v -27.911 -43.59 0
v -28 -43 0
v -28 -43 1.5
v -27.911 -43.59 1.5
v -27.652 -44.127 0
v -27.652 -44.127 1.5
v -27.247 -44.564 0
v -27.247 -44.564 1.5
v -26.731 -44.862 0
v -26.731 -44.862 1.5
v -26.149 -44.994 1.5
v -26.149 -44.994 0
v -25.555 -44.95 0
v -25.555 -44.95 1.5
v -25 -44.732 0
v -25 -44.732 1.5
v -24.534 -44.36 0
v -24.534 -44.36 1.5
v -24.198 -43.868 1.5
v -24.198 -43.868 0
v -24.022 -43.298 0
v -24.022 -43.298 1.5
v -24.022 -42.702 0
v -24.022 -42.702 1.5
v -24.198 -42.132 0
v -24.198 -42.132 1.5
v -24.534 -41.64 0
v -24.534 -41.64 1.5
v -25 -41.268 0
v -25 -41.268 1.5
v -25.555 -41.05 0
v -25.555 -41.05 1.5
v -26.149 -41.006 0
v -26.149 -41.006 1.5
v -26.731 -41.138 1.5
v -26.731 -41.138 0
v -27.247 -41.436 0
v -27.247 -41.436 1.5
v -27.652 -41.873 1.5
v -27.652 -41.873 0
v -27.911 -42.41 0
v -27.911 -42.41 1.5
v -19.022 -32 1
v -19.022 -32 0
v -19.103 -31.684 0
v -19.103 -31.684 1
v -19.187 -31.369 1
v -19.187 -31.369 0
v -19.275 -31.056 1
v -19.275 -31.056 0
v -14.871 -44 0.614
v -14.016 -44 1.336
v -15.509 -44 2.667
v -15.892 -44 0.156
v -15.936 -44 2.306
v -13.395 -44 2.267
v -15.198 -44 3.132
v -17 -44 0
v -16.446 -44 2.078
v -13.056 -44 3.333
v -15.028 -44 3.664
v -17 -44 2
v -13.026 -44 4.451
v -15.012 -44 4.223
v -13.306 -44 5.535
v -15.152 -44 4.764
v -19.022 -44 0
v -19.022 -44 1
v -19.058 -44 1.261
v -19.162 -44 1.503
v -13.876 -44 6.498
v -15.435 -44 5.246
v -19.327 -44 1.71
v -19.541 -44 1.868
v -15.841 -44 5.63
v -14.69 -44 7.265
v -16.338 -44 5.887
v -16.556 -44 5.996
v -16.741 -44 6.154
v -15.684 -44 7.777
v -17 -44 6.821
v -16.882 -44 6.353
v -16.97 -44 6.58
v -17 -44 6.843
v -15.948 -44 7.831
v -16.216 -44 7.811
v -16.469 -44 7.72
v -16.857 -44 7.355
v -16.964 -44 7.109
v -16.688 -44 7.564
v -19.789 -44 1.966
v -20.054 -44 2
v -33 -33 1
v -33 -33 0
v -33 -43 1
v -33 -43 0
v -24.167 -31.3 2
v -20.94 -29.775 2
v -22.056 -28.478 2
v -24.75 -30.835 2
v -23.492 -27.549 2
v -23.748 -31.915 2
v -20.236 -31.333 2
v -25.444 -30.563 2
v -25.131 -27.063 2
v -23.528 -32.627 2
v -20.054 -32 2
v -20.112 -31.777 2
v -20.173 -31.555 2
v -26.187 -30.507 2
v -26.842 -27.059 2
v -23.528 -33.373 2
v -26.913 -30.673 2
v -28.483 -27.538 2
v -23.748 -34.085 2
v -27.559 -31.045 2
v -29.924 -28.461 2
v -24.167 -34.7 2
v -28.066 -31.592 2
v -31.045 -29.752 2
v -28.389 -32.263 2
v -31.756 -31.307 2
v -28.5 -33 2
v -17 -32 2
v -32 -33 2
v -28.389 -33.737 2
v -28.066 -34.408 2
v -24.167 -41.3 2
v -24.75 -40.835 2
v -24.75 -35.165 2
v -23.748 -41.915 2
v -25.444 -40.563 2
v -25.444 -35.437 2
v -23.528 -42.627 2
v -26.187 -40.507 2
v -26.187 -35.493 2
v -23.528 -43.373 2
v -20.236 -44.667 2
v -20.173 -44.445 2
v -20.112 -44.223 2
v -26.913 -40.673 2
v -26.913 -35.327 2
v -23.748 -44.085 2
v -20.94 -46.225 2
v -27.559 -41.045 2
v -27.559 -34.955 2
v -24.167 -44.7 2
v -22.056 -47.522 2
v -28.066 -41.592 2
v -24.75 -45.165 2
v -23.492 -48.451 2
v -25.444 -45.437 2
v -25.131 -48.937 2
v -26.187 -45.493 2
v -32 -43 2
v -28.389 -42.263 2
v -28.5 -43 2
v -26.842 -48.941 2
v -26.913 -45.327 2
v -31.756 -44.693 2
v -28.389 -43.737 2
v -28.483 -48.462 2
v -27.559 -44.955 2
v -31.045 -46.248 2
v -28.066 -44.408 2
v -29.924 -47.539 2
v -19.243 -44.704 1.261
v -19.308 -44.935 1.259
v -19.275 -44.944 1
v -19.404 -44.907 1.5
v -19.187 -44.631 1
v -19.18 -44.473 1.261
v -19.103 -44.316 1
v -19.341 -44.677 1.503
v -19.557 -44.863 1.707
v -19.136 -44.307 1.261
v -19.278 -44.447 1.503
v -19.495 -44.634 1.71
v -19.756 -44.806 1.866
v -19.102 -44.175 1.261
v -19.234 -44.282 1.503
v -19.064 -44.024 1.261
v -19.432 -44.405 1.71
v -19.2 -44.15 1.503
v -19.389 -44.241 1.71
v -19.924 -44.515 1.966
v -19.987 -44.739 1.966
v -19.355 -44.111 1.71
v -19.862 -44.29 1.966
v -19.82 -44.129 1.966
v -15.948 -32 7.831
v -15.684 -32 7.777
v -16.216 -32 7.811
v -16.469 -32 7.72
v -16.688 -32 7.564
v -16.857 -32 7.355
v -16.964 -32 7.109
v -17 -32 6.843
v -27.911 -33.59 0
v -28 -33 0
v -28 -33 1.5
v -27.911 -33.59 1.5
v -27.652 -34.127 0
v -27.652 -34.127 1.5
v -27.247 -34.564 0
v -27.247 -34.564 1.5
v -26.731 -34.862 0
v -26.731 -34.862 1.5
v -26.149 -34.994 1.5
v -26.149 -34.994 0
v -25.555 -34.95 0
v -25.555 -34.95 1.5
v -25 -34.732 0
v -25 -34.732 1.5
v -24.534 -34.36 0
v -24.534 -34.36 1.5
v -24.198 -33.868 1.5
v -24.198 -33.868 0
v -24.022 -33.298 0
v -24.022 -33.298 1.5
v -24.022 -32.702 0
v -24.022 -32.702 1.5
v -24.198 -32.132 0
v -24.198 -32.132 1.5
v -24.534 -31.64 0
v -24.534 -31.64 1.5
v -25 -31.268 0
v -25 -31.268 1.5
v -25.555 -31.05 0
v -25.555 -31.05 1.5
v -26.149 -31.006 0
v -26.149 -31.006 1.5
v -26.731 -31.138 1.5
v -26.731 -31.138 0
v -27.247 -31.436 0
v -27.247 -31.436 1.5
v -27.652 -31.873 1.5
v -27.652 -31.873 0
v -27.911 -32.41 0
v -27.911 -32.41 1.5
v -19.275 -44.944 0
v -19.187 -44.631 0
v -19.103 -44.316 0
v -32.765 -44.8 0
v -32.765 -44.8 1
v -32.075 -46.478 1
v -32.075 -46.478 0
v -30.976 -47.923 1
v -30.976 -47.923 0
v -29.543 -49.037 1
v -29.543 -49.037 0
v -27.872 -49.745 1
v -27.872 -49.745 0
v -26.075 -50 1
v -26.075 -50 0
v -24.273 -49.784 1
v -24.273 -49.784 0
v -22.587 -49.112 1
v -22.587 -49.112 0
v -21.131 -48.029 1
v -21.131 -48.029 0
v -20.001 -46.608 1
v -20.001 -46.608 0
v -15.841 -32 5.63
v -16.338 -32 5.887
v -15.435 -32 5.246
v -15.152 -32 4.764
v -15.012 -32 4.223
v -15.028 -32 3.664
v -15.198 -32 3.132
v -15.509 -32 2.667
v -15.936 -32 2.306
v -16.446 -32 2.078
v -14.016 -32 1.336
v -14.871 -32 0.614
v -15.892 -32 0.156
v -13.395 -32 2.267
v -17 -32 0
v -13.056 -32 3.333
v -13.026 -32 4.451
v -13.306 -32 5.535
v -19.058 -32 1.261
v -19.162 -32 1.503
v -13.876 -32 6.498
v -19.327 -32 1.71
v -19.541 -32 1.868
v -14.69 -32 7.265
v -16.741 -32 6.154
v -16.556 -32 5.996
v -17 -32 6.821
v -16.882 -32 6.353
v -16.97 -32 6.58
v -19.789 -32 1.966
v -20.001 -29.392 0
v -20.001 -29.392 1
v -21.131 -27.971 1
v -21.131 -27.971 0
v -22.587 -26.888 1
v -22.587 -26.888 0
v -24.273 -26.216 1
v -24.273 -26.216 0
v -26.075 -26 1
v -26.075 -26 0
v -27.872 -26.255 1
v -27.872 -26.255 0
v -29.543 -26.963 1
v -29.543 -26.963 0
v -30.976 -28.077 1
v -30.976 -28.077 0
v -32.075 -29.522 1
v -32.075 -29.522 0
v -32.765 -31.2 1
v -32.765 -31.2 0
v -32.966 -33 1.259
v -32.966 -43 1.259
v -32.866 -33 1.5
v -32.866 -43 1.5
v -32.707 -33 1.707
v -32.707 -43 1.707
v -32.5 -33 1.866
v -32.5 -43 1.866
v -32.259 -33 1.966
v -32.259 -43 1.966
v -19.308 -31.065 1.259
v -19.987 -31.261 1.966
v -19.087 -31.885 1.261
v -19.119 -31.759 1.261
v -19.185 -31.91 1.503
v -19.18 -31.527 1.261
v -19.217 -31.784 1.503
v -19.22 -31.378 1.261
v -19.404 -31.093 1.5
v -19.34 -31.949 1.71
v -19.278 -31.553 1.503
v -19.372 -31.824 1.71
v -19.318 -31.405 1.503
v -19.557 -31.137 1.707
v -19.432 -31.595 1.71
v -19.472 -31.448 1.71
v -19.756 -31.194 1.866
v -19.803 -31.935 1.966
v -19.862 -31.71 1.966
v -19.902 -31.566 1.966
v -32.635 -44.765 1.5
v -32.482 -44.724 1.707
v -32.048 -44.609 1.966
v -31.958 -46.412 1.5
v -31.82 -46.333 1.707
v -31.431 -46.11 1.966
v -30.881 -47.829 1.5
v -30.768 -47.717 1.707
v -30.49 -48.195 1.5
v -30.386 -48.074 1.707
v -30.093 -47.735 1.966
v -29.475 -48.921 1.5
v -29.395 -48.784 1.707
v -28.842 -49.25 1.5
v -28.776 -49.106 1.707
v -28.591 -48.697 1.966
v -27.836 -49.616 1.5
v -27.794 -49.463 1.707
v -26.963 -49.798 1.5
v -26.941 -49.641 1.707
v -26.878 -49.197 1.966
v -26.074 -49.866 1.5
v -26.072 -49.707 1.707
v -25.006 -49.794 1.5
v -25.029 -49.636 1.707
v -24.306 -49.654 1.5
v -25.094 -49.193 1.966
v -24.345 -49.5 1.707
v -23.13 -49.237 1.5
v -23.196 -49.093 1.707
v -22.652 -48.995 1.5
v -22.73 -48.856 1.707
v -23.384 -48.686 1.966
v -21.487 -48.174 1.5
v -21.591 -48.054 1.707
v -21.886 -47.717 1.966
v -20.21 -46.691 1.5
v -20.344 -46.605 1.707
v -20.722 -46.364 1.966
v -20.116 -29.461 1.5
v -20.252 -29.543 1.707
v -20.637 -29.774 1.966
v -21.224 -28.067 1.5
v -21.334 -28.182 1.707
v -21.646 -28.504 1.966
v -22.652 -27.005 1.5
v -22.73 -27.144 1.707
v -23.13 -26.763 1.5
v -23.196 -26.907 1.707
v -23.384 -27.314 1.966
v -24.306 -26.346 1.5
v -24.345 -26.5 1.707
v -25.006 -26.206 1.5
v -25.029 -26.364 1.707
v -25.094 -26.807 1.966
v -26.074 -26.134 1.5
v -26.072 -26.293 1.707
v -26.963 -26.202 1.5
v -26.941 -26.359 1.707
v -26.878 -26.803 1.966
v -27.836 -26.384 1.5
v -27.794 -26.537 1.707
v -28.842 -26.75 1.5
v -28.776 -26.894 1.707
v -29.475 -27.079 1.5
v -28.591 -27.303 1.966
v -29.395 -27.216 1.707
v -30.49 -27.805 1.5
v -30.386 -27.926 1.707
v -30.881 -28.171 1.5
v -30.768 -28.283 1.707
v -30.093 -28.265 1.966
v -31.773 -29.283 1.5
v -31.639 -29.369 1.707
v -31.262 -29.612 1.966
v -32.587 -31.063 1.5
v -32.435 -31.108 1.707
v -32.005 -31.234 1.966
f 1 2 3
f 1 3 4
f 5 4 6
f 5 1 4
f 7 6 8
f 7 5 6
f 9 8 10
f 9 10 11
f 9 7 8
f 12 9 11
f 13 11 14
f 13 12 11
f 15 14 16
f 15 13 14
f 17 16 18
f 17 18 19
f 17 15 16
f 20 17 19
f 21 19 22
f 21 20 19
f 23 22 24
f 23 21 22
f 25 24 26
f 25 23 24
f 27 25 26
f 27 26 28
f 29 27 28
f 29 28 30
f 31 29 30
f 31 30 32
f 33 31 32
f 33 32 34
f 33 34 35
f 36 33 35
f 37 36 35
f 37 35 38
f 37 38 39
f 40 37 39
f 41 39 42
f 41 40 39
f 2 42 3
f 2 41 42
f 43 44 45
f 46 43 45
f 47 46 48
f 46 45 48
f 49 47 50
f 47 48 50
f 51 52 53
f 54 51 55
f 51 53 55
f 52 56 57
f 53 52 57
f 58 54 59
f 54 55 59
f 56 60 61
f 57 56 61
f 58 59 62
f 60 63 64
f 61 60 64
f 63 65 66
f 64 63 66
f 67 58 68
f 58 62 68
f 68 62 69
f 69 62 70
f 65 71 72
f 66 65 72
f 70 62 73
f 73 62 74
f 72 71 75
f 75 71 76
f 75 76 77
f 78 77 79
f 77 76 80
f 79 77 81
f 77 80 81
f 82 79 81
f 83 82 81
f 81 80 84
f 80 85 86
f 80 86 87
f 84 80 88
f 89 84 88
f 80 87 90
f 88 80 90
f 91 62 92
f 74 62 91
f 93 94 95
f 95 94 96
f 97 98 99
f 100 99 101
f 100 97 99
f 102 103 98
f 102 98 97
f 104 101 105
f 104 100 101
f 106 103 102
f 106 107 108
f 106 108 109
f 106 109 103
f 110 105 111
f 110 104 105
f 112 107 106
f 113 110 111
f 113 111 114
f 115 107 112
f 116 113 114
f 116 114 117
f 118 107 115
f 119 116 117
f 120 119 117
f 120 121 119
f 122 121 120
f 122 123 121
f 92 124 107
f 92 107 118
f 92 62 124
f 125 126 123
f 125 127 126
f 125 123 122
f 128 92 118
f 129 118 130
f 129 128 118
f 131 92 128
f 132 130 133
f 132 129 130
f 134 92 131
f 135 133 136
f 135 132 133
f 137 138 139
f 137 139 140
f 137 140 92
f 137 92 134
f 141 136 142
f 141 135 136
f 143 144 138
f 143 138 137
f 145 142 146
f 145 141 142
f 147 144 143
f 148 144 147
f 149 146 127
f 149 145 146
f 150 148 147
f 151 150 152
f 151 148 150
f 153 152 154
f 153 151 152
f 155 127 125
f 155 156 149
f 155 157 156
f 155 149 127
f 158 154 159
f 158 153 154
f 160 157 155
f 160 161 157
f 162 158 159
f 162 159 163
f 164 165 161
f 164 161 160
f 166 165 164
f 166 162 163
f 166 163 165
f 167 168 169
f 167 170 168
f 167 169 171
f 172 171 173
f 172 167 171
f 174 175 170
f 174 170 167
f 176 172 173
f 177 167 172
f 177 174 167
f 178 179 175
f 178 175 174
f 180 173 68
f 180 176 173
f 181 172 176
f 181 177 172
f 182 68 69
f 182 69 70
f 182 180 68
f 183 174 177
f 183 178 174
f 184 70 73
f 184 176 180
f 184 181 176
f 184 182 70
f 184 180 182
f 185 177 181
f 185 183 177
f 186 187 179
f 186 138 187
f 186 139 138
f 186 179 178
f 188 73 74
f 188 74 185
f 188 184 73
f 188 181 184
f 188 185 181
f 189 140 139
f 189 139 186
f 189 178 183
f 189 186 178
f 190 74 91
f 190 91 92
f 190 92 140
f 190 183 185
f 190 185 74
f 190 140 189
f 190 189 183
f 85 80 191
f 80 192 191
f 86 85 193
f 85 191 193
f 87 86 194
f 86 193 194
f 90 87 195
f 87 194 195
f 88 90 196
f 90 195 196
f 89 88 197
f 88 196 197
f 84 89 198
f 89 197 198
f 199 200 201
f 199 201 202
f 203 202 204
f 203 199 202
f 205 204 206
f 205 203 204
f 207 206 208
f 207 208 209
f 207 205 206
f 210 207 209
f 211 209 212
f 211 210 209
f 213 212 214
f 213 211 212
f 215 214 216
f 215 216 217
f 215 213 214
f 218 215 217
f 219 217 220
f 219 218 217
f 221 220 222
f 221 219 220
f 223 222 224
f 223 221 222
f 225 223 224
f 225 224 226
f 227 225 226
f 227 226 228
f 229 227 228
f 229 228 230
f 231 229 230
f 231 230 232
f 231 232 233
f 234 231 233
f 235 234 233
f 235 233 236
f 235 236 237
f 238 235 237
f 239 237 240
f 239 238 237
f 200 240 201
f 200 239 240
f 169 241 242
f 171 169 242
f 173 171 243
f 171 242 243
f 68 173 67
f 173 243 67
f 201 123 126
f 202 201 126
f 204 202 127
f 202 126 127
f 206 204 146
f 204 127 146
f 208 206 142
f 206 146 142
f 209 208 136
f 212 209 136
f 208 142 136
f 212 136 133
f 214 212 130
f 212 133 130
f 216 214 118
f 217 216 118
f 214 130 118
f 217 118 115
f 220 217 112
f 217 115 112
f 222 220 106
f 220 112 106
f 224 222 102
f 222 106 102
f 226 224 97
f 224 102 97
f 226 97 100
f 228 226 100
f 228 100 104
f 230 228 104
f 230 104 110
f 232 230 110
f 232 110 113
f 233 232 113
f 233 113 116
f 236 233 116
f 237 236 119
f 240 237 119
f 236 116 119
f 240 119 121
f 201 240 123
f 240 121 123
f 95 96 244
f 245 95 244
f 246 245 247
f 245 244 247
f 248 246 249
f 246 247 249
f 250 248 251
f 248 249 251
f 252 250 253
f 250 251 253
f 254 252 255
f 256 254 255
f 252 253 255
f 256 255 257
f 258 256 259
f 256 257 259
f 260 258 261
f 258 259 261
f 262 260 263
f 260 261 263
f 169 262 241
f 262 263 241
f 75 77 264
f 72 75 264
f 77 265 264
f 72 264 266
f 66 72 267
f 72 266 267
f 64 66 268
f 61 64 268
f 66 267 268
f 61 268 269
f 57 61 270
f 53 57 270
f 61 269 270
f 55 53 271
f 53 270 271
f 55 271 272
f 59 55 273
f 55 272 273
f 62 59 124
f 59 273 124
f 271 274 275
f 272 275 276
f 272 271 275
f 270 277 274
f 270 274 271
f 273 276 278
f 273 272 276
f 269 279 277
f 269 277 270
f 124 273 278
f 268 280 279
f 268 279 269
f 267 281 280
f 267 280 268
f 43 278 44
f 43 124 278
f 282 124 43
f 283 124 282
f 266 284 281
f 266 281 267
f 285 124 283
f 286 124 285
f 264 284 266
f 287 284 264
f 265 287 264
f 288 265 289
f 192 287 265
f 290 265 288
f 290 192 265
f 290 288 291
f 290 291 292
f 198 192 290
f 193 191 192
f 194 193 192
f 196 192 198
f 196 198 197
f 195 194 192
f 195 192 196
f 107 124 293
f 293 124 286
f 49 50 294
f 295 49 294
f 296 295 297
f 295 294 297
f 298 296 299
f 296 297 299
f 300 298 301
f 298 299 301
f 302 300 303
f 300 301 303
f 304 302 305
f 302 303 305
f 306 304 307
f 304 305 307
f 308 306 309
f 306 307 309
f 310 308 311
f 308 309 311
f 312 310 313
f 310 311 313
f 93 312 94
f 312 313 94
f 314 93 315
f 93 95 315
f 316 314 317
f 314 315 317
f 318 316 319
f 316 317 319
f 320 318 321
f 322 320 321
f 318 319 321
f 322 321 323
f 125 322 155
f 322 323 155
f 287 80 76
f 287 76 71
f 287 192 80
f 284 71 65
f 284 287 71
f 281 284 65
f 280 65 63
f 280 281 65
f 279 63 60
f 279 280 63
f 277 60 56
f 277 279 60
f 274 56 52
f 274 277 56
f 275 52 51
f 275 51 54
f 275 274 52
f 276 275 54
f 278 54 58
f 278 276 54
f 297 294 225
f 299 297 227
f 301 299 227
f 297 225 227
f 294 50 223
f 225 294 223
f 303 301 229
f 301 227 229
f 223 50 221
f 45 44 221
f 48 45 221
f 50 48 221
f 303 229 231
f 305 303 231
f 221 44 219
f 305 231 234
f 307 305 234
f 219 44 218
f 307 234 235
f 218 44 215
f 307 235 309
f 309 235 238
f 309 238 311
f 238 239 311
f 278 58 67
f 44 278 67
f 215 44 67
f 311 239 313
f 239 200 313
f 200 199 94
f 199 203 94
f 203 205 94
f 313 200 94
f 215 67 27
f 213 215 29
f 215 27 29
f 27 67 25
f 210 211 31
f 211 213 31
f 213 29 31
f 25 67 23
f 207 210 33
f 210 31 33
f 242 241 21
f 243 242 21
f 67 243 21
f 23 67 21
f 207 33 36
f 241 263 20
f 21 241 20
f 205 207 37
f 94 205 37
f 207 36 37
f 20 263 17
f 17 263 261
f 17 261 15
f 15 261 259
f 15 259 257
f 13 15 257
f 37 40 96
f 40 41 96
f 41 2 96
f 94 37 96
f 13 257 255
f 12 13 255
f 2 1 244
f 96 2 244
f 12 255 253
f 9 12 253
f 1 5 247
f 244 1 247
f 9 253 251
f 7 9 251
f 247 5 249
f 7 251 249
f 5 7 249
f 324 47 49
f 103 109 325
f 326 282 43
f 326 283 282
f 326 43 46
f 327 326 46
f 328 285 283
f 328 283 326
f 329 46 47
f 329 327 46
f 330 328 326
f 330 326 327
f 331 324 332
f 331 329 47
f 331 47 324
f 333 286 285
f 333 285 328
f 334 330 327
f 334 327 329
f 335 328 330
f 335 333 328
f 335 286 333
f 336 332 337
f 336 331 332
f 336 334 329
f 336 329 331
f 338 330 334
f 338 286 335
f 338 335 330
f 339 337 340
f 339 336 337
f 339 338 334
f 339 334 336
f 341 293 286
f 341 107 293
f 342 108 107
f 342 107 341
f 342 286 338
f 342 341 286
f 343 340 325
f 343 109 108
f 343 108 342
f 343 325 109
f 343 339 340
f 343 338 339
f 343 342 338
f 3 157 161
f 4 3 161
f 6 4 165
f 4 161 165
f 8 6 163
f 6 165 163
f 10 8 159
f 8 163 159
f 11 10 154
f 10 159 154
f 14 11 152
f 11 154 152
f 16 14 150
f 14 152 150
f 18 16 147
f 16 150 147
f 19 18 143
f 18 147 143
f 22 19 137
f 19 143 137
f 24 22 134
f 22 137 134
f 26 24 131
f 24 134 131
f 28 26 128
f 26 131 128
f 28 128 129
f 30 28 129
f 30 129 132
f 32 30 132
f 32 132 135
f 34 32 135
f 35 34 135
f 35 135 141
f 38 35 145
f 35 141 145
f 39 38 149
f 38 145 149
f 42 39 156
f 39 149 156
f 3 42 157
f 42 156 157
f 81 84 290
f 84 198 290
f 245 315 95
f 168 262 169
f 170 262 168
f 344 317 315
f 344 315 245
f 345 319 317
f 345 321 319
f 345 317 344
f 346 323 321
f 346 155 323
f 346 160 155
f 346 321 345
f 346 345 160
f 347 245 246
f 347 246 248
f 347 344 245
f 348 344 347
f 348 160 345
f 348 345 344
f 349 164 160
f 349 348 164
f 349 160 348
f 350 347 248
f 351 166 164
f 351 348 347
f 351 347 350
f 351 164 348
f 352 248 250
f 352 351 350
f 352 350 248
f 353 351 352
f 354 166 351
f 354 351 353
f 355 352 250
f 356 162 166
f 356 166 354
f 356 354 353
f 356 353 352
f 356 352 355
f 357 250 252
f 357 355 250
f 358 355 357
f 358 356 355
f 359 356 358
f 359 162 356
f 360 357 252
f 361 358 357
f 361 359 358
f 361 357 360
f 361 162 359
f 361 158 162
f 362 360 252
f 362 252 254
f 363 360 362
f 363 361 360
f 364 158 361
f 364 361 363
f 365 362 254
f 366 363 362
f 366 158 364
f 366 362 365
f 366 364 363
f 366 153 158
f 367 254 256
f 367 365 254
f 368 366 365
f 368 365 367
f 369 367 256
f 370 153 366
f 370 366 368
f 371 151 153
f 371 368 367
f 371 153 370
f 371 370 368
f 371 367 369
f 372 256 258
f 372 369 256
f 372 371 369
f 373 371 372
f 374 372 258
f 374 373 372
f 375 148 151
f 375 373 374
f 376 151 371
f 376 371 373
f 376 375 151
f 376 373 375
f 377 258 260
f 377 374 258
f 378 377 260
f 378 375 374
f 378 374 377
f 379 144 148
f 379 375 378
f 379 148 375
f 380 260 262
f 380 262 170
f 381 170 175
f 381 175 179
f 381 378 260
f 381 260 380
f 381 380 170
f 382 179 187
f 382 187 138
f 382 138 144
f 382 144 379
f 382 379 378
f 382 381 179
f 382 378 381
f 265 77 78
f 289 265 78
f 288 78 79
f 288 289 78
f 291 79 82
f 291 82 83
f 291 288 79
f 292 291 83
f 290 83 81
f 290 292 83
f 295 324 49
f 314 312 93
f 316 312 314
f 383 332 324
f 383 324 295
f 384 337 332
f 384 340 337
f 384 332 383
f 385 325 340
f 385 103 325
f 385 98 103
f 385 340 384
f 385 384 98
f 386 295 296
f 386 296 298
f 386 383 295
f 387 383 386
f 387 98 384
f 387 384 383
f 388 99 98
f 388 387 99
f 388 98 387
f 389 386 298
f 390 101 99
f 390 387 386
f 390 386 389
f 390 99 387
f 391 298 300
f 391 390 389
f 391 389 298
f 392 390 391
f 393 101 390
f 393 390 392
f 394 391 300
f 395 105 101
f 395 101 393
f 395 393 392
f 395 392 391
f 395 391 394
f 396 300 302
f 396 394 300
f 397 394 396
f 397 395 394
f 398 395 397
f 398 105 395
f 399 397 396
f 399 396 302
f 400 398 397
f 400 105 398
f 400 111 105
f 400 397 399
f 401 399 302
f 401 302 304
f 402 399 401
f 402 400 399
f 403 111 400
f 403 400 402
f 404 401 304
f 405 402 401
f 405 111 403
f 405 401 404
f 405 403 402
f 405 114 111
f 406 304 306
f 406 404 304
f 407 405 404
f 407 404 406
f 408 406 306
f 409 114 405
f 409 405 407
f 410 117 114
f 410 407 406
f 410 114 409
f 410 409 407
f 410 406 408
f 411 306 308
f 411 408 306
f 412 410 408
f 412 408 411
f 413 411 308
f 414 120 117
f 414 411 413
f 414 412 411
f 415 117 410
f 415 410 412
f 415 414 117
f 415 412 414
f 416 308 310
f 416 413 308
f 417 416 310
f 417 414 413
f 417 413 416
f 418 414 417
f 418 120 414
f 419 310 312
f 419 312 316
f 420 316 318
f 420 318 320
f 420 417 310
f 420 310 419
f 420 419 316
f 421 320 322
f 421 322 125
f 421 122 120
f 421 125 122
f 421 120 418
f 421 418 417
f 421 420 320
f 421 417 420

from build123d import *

# Parameters (mm, degrees)
SKETCH_R             = 2
PAD_DEPTH            = 2
PAD001_DEPTH         = 6
CHAMFER_SIZE         = 0.5
FILLET_R             = 0.99
FILLET001_R          = 1
BODY_PLACEMENT_ANGLE = 180


with BuildPart() as part:
    # Sketch → Pad (new body)
    with BuildSketch(Plane.XY):
        with BuildLine():
            ThreePointArc((7, 5), (0.981931, 11.930787), (-6.724518, 6.944444))
            ThreePointArc((-6.724518, 6.944444), (-7.708384, 0), (-6.724518, -6.944444))
            ThreePointArc((-6.724518, -6.944444), (0.981931, -11.930787), (7, -5))
            Line((7, -5), (7, 5))
        make_face()
        with Locations((0, 5)):
            Circle(SKETCH_R, mode=Mode.SUBTRACT)
        with Locations((0, -5)):
            Circle(SKETCH_R, mode=Mode.SUBTRACT)
    extrude(amount=PAD_DEPTH)

    # Sketch001 → Pad001 (join, symmetric)
    with BuildSketch(Plane.XZ):
        with BuildLine():
            Line((-6.724518, 2), (-9, 2))
            ThreePointArc((-9, 6), (-11, 4), (-9, 2))
            Line((-9, 8), (-9, 6))
            ThreePointArc((-9, 8), (-13, 4), (-9, 0))
            Line((-6.724518, 0), (-9, 0))
            Line((-6.724518, 2), (-6.724518, 0))
        make_face()
    extrude(amount=PAD001_DEPTH, both=True)

    # Chamfer
    chamfer_edges = [part.edges().sort_by_distance(p)[0] for p in [
        (-2, -5, 2),
        (-2, 5, 2),
    ]]
    chamfer(chamfer_edges, length=CHAMFER_SIZE)

    # Fillet
    fillet_edges = [part.edges().sort_by_distance(p)[0] for p in [
        (-9, 0, 8),
        (-9, 0, 6),
    ]]
    fillet(fillet_edges, radius=FILLET_R)

    # Fillet001
    fillet001_edges = [part.edges().sort_by_distance(p)[0] for p in [
        (-6.855729, 6.47346, 2),
        (0.981931, 11.930787, 2),
        (7, 0, 2),
        (0.981931, -11.930787, 2),
        (-6.855729, -6.47346, 2),
    ]]
    fillet(fillet001_edges, radius=FILLET001_R)


with BuildPart() as part_1:
    # Body placement: moved
    add(part.part.moved(Location((-26, -38, 0))).rotate(Axis((-26, -38, 0), (0, 0, 1)), BODY_PLACEMENT_ANGLE))


solid = part_1.part
